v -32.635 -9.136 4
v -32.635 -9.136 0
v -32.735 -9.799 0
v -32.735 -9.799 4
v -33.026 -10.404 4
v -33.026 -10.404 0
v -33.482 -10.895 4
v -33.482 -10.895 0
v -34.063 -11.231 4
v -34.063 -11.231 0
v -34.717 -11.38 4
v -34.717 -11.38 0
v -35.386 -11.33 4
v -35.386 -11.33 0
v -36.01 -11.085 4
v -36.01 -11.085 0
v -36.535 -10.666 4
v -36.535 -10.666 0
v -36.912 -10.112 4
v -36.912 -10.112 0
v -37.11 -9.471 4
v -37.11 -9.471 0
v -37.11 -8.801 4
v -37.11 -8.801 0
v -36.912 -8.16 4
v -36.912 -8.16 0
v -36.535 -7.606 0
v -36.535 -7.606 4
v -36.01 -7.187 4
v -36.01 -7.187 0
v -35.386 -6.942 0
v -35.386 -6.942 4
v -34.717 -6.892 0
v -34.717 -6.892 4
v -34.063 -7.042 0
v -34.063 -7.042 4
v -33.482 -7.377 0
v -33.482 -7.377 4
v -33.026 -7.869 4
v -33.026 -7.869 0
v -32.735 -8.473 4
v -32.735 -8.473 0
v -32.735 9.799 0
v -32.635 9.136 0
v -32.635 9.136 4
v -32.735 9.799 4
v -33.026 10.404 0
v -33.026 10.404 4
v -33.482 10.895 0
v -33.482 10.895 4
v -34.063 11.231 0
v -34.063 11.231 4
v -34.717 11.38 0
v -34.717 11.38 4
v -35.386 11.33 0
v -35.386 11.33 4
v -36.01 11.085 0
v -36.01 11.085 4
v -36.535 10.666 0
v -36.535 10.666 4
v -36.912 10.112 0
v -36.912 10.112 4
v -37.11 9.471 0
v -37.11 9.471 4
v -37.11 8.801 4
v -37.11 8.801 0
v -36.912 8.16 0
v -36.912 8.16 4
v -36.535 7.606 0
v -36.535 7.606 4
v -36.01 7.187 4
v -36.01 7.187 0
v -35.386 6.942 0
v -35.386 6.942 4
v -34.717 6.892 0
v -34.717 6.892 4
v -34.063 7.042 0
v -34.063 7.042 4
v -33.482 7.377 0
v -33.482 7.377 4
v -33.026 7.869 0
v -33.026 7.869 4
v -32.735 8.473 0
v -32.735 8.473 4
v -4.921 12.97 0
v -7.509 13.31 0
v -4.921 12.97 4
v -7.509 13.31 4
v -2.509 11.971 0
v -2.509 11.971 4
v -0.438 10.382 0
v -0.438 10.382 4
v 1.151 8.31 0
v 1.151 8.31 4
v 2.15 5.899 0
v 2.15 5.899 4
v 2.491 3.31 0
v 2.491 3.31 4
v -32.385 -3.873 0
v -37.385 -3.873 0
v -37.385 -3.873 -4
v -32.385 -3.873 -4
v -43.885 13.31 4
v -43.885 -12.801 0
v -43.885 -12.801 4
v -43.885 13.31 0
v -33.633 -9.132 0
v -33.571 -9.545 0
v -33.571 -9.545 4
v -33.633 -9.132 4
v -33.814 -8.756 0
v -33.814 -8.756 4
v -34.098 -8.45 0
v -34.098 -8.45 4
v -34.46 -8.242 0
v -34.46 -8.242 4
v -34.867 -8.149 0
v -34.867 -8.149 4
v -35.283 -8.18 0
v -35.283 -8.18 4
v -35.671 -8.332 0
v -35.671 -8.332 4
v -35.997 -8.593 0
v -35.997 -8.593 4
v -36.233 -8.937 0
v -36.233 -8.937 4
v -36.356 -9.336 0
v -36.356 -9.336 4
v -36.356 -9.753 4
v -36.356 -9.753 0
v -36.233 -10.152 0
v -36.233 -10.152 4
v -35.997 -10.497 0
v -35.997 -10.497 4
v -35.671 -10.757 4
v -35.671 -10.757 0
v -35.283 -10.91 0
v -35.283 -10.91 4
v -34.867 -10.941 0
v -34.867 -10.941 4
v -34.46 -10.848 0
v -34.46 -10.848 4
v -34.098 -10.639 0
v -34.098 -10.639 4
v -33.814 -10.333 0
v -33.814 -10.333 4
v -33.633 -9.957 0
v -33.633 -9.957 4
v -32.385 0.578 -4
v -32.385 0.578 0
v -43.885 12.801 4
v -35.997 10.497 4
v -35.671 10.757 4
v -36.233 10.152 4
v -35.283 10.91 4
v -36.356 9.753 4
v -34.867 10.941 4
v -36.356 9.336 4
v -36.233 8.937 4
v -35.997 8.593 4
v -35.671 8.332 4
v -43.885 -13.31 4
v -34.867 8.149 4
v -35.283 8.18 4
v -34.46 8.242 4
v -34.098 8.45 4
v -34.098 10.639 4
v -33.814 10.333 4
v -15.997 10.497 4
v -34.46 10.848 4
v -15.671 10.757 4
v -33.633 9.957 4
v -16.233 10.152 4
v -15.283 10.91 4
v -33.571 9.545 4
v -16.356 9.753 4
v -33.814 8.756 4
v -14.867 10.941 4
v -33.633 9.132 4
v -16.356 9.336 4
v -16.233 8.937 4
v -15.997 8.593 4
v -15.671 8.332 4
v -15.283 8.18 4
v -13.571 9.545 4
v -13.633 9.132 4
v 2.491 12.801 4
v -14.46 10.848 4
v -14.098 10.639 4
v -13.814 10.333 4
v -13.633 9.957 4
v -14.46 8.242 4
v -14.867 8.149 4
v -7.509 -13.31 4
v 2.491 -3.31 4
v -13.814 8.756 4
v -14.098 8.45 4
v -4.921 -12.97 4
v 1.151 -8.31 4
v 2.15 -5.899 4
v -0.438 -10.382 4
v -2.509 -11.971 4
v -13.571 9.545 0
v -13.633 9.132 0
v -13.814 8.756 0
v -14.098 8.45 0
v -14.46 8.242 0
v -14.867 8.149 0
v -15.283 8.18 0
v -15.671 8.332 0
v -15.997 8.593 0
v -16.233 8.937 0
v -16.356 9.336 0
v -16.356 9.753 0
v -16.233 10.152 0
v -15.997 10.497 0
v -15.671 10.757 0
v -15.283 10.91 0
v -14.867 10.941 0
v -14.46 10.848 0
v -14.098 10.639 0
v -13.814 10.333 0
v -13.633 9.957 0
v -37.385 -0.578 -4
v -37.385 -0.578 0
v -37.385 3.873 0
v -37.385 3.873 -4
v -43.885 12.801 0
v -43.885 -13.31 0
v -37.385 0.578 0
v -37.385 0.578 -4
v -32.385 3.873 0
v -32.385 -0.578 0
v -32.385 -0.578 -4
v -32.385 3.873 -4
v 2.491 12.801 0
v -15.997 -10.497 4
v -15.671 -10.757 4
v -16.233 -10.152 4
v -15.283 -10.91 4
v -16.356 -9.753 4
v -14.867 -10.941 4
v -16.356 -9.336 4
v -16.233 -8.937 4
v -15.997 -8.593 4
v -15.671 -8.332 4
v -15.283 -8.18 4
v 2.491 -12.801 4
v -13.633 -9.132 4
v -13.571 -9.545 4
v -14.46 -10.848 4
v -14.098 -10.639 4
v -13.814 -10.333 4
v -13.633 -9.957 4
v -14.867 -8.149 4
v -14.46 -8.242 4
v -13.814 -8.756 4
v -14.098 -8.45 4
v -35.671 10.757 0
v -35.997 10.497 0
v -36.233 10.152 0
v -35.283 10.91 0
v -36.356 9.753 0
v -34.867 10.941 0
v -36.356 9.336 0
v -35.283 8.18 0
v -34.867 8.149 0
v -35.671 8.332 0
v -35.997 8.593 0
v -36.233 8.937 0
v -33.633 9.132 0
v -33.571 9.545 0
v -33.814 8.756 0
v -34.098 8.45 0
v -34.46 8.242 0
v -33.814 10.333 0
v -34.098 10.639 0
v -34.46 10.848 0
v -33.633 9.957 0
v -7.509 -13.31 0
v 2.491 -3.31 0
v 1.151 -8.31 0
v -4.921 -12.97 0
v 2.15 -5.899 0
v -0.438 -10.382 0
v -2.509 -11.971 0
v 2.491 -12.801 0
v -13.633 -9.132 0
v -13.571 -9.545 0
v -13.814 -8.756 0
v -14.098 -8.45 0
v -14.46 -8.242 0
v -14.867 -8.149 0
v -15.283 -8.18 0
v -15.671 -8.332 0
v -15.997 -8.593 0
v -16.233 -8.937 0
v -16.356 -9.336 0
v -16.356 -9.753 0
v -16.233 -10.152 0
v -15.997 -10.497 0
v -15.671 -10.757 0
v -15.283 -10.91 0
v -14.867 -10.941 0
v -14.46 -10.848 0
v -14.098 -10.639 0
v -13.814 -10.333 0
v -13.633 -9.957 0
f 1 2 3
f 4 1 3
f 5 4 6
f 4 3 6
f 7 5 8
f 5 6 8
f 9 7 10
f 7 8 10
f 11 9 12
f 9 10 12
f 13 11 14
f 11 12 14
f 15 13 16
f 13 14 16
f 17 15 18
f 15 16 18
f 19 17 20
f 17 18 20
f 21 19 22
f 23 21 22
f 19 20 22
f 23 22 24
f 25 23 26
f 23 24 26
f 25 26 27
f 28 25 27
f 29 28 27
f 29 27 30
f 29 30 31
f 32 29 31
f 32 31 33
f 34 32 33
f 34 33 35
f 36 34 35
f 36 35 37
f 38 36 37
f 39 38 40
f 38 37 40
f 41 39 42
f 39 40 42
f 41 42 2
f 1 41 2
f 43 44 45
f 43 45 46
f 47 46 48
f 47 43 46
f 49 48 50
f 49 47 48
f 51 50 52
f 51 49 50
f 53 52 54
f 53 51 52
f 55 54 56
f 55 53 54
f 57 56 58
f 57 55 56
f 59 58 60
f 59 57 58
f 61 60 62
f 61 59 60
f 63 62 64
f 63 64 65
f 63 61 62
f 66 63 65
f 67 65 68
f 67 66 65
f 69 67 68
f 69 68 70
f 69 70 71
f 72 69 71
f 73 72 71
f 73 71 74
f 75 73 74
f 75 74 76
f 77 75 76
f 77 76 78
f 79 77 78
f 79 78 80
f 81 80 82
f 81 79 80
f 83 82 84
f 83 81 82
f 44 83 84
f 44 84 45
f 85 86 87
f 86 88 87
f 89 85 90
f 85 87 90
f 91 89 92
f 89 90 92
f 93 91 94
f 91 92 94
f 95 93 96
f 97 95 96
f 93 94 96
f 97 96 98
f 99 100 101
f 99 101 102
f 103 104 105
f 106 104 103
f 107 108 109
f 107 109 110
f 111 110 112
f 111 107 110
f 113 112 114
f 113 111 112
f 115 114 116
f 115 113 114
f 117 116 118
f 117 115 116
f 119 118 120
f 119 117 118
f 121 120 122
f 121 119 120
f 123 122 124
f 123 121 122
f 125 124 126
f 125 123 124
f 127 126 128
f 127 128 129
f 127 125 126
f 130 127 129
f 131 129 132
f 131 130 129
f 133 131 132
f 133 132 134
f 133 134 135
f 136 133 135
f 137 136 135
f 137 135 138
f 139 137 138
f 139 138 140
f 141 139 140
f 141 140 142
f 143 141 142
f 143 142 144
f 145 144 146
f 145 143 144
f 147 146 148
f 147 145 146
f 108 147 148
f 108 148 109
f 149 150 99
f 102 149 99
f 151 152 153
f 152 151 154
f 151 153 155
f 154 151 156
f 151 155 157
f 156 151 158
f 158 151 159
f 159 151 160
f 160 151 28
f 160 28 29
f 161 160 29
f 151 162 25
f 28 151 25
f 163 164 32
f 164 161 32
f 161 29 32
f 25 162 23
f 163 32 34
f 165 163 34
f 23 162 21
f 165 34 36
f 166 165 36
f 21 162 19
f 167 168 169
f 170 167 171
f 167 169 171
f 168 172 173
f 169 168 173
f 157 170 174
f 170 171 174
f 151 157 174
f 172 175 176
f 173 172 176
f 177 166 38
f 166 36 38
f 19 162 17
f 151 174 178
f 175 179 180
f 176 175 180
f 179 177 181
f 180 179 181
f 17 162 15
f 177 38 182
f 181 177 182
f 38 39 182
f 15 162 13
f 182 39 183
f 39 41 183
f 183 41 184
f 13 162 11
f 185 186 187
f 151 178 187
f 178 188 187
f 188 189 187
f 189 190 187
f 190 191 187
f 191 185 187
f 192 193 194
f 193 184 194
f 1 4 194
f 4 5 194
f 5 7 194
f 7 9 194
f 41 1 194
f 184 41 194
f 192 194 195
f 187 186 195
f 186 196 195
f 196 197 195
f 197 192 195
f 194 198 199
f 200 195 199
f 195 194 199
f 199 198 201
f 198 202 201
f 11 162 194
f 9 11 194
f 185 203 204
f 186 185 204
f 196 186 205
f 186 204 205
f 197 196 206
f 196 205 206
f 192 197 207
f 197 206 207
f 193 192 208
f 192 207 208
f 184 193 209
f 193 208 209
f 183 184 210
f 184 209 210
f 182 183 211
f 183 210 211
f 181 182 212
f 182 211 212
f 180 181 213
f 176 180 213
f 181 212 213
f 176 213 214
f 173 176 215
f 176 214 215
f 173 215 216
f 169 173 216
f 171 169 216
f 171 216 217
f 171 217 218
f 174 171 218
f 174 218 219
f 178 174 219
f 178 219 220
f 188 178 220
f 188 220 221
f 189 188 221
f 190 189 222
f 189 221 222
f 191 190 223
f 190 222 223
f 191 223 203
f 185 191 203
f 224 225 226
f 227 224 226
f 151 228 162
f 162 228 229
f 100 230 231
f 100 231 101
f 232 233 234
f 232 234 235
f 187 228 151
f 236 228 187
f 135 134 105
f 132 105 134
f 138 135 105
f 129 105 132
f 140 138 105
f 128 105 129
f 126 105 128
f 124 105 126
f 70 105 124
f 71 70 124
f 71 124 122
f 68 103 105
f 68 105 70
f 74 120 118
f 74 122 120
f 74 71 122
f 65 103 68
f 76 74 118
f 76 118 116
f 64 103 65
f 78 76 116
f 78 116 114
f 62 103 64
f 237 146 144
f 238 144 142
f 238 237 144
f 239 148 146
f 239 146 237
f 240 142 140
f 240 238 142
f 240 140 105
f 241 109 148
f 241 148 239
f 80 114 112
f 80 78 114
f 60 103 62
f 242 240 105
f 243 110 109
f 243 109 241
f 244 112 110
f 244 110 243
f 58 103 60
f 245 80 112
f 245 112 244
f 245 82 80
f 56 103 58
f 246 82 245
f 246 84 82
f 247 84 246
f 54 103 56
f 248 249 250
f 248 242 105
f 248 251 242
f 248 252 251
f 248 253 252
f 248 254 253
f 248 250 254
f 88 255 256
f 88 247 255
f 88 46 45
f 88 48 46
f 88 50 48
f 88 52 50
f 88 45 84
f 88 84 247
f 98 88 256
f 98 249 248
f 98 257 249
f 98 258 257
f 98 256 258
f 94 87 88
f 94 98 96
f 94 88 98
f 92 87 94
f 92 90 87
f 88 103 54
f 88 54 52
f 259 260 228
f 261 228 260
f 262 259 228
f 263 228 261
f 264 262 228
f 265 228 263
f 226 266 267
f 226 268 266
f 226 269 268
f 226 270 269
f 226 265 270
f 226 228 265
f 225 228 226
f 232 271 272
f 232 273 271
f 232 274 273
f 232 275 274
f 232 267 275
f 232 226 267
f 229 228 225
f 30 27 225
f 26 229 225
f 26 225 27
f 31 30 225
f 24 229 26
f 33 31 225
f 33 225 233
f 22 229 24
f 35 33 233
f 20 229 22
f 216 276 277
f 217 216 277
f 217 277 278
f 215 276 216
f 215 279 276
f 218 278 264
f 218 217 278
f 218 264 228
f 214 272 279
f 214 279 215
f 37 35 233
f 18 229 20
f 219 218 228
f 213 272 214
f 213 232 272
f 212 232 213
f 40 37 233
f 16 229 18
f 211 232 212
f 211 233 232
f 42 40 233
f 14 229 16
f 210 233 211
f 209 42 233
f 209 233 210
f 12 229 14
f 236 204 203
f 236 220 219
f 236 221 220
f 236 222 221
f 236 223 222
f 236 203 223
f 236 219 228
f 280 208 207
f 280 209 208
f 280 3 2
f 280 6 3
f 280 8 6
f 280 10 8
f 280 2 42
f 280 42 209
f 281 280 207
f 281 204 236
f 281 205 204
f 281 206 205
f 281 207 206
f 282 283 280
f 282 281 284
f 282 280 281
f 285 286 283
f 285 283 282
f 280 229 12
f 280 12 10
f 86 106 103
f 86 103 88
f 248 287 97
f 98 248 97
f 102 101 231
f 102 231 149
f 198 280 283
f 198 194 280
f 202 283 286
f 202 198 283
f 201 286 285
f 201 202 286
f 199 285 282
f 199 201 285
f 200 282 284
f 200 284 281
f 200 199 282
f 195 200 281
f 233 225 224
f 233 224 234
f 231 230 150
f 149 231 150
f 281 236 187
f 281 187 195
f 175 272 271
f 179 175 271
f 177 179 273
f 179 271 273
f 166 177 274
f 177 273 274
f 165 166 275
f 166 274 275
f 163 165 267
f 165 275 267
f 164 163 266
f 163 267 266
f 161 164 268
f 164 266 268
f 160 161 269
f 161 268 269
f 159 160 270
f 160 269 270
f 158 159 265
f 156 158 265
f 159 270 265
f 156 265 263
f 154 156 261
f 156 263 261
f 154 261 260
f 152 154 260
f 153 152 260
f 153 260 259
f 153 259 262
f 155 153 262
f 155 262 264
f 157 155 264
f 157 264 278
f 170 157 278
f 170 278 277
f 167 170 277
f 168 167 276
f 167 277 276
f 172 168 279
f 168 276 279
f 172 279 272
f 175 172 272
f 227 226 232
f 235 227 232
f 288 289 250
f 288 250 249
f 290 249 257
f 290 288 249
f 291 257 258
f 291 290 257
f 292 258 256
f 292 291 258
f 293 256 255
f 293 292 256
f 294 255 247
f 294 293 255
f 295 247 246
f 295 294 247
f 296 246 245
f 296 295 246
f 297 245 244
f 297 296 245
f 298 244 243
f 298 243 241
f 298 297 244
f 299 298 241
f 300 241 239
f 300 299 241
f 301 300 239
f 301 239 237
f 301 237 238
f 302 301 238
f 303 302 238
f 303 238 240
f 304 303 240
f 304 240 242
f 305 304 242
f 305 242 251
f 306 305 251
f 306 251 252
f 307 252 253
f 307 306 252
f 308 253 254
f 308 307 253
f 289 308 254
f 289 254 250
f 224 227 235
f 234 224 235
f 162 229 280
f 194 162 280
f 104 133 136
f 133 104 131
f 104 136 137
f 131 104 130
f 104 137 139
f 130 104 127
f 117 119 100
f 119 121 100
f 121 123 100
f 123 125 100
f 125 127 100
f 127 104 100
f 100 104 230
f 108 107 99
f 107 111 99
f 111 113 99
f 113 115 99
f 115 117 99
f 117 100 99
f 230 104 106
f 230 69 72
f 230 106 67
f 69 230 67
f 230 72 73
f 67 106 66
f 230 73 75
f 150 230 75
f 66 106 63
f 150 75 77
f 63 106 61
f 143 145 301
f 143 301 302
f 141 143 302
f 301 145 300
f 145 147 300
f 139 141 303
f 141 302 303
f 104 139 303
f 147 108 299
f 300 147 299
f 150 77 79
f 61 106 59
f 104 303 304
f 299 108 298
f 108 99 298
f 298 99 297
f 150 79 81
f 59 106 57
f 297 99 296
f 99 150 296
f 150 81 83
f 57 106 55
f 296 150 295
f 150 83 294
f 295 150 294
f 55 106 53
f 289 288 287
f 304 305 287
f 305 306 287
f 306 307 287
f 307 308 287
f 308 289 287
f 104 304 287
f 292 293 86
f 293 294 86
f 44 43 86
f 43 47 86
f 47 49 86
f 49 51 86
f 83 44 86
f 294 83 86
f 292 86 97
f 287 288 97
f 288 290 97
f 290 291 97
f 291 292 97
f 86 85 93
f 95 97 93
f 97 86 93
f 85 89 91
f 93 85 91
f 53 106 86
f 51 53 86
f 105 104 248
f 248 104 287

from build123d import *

# Parameters (mm, degrees)
F0_W     = 46.376184
F0_H     = 26.111616
F0_R     = 1.4
F0_R_2   = 2.25
F1_DEPTH = 4
F2_W     = 5
F2_H     = 4.45055
F3_DEPTH = 4
F4_R     = 10


with BuildPart() as f1:
    # F0 (on Top) → F1 (new body)
    with BuildSketch(Plane.XY):
        with Locations((-20.697201, 0.254628)):
            Rectangle(F0_W, F0_H)
        with Locations((-34.971185, -9.544797)):
            Circle(F0_R, mode=Mode.SUBTRACT)
        with Locations((-14.971185, -9.544797)):
            Circle(F0_R, mode=Mode.SUBTRACT)
        with Locations((-34.885293, 9.136044)):
            Circle(F0_R_2, mode=Mode.SUBTRACT)
    extrude(amount=F1_DEPTH)

    # F2 (on face) → F3 (join)
    with BuildSketch(Plane(origin=(0, 0, 0), x_dir=(1, 0, 0), z_dir=(0, 0, -1))):
        with Locations((-34.885293, 1.647318)):
            Rectangle(F2_W, F2_H)
    extrude(amount=F3_DEPTH)

    # F4
    f4_edges = [f1.edges().sort_by_distance(p)[0] for p in [
        (2.490891, 13.310436, 2),
    ]]
    fillet(f4_edges, radius=F4_R)


with BuildPart() as f5_1:
    # F5: instance of F1
    add(f1.part.mirror(Plane.XZ))


solid = Compound([f1.part, f5_1.part])
